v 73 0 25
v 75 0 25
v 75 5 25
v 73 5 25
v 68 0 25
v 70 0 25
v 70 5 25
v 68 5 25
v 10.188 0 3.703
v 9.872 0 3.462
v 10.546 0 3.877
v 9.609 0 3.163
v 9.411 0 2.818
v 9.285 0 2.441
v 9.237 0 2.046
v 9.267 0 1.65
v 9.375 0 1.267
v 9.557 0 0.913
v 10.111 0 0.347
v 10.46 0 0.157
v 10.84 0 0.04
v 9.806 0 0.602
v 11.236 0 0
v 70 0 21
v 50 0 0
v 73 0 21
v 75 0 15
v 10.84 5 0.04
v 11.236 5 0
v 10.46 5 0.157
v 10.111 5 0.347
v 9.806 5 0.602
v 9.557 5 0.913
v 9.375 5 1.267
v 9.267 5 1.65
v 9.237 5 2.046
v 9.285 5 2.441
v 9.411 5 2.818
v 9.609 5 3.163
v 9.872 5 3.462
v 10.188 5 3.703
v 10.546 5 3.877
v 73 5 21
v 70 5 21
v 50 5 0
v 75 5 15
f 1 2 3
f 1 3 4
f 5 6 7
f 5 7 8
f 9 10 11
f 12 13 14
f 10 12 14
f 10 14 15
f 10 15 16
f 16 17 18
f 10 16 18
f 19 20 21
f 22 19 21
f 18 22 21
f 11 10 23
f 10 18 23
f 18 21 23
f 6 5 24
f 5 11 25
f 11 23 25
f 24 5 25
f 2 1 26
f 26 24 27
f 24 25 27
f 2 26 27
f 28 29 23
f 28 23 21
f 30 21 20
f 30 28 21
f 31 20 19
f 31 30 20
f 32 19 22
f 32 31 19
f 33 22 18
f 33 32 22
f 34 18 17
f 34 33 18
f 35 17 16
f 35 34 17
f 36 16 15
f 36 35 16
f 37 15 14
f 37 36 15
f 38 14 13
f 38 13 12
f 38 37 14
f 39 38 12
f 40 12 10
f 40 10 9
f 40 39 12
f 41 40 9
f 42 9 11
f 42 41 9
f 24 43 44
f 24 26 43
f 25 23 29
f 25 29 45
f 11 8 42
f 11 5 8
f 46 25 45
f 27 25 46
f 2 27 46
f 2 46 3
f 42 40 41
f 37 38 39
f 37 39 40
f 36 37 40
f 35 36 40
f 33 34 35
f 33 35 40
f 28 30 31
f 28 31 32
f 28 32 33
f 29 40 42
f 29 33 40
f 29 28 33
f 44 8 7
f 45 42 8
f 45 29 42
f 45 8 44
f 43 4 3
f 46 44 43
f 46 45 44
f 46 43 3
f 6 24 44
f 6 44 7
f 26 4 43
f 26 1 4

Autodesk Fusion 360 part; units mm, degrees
sketch "Sketch1" plane through (0, 0, 0) normal (0, 1, 0) x (1, 0, 0)
  line L0 (0, 0) -> (50, 0)
  line L1 (50, 0) -> (75, -15)
  line L2 (75, -15) -> (75, -25)
  line L3 (75, -25) -> (68, -25)
  line L4 (68, -25) -> (0, 0)
  line L5 (70, -25) -> (73, -25)
  line L6 (73, -25) -> (73, -21)
  line L7 (73, -21) -> (70, -21)
  line L8 (70, -21) -> (70, -25)
  dimension "d1" = 50
  dimension "d3" = 15
  dimension "d4" = 25
  dimension "d7" = 7
  dimension "d8" = 3
  dimension "d9" = 4
extrude "Extrude1" add sketch "Sketch1" along normal blind 5 contours L0 L1 L2 L3 L4 L6 L7 L8
fillet "Fillet1" radius 2 1 edges at (0, 2.5, 0)
